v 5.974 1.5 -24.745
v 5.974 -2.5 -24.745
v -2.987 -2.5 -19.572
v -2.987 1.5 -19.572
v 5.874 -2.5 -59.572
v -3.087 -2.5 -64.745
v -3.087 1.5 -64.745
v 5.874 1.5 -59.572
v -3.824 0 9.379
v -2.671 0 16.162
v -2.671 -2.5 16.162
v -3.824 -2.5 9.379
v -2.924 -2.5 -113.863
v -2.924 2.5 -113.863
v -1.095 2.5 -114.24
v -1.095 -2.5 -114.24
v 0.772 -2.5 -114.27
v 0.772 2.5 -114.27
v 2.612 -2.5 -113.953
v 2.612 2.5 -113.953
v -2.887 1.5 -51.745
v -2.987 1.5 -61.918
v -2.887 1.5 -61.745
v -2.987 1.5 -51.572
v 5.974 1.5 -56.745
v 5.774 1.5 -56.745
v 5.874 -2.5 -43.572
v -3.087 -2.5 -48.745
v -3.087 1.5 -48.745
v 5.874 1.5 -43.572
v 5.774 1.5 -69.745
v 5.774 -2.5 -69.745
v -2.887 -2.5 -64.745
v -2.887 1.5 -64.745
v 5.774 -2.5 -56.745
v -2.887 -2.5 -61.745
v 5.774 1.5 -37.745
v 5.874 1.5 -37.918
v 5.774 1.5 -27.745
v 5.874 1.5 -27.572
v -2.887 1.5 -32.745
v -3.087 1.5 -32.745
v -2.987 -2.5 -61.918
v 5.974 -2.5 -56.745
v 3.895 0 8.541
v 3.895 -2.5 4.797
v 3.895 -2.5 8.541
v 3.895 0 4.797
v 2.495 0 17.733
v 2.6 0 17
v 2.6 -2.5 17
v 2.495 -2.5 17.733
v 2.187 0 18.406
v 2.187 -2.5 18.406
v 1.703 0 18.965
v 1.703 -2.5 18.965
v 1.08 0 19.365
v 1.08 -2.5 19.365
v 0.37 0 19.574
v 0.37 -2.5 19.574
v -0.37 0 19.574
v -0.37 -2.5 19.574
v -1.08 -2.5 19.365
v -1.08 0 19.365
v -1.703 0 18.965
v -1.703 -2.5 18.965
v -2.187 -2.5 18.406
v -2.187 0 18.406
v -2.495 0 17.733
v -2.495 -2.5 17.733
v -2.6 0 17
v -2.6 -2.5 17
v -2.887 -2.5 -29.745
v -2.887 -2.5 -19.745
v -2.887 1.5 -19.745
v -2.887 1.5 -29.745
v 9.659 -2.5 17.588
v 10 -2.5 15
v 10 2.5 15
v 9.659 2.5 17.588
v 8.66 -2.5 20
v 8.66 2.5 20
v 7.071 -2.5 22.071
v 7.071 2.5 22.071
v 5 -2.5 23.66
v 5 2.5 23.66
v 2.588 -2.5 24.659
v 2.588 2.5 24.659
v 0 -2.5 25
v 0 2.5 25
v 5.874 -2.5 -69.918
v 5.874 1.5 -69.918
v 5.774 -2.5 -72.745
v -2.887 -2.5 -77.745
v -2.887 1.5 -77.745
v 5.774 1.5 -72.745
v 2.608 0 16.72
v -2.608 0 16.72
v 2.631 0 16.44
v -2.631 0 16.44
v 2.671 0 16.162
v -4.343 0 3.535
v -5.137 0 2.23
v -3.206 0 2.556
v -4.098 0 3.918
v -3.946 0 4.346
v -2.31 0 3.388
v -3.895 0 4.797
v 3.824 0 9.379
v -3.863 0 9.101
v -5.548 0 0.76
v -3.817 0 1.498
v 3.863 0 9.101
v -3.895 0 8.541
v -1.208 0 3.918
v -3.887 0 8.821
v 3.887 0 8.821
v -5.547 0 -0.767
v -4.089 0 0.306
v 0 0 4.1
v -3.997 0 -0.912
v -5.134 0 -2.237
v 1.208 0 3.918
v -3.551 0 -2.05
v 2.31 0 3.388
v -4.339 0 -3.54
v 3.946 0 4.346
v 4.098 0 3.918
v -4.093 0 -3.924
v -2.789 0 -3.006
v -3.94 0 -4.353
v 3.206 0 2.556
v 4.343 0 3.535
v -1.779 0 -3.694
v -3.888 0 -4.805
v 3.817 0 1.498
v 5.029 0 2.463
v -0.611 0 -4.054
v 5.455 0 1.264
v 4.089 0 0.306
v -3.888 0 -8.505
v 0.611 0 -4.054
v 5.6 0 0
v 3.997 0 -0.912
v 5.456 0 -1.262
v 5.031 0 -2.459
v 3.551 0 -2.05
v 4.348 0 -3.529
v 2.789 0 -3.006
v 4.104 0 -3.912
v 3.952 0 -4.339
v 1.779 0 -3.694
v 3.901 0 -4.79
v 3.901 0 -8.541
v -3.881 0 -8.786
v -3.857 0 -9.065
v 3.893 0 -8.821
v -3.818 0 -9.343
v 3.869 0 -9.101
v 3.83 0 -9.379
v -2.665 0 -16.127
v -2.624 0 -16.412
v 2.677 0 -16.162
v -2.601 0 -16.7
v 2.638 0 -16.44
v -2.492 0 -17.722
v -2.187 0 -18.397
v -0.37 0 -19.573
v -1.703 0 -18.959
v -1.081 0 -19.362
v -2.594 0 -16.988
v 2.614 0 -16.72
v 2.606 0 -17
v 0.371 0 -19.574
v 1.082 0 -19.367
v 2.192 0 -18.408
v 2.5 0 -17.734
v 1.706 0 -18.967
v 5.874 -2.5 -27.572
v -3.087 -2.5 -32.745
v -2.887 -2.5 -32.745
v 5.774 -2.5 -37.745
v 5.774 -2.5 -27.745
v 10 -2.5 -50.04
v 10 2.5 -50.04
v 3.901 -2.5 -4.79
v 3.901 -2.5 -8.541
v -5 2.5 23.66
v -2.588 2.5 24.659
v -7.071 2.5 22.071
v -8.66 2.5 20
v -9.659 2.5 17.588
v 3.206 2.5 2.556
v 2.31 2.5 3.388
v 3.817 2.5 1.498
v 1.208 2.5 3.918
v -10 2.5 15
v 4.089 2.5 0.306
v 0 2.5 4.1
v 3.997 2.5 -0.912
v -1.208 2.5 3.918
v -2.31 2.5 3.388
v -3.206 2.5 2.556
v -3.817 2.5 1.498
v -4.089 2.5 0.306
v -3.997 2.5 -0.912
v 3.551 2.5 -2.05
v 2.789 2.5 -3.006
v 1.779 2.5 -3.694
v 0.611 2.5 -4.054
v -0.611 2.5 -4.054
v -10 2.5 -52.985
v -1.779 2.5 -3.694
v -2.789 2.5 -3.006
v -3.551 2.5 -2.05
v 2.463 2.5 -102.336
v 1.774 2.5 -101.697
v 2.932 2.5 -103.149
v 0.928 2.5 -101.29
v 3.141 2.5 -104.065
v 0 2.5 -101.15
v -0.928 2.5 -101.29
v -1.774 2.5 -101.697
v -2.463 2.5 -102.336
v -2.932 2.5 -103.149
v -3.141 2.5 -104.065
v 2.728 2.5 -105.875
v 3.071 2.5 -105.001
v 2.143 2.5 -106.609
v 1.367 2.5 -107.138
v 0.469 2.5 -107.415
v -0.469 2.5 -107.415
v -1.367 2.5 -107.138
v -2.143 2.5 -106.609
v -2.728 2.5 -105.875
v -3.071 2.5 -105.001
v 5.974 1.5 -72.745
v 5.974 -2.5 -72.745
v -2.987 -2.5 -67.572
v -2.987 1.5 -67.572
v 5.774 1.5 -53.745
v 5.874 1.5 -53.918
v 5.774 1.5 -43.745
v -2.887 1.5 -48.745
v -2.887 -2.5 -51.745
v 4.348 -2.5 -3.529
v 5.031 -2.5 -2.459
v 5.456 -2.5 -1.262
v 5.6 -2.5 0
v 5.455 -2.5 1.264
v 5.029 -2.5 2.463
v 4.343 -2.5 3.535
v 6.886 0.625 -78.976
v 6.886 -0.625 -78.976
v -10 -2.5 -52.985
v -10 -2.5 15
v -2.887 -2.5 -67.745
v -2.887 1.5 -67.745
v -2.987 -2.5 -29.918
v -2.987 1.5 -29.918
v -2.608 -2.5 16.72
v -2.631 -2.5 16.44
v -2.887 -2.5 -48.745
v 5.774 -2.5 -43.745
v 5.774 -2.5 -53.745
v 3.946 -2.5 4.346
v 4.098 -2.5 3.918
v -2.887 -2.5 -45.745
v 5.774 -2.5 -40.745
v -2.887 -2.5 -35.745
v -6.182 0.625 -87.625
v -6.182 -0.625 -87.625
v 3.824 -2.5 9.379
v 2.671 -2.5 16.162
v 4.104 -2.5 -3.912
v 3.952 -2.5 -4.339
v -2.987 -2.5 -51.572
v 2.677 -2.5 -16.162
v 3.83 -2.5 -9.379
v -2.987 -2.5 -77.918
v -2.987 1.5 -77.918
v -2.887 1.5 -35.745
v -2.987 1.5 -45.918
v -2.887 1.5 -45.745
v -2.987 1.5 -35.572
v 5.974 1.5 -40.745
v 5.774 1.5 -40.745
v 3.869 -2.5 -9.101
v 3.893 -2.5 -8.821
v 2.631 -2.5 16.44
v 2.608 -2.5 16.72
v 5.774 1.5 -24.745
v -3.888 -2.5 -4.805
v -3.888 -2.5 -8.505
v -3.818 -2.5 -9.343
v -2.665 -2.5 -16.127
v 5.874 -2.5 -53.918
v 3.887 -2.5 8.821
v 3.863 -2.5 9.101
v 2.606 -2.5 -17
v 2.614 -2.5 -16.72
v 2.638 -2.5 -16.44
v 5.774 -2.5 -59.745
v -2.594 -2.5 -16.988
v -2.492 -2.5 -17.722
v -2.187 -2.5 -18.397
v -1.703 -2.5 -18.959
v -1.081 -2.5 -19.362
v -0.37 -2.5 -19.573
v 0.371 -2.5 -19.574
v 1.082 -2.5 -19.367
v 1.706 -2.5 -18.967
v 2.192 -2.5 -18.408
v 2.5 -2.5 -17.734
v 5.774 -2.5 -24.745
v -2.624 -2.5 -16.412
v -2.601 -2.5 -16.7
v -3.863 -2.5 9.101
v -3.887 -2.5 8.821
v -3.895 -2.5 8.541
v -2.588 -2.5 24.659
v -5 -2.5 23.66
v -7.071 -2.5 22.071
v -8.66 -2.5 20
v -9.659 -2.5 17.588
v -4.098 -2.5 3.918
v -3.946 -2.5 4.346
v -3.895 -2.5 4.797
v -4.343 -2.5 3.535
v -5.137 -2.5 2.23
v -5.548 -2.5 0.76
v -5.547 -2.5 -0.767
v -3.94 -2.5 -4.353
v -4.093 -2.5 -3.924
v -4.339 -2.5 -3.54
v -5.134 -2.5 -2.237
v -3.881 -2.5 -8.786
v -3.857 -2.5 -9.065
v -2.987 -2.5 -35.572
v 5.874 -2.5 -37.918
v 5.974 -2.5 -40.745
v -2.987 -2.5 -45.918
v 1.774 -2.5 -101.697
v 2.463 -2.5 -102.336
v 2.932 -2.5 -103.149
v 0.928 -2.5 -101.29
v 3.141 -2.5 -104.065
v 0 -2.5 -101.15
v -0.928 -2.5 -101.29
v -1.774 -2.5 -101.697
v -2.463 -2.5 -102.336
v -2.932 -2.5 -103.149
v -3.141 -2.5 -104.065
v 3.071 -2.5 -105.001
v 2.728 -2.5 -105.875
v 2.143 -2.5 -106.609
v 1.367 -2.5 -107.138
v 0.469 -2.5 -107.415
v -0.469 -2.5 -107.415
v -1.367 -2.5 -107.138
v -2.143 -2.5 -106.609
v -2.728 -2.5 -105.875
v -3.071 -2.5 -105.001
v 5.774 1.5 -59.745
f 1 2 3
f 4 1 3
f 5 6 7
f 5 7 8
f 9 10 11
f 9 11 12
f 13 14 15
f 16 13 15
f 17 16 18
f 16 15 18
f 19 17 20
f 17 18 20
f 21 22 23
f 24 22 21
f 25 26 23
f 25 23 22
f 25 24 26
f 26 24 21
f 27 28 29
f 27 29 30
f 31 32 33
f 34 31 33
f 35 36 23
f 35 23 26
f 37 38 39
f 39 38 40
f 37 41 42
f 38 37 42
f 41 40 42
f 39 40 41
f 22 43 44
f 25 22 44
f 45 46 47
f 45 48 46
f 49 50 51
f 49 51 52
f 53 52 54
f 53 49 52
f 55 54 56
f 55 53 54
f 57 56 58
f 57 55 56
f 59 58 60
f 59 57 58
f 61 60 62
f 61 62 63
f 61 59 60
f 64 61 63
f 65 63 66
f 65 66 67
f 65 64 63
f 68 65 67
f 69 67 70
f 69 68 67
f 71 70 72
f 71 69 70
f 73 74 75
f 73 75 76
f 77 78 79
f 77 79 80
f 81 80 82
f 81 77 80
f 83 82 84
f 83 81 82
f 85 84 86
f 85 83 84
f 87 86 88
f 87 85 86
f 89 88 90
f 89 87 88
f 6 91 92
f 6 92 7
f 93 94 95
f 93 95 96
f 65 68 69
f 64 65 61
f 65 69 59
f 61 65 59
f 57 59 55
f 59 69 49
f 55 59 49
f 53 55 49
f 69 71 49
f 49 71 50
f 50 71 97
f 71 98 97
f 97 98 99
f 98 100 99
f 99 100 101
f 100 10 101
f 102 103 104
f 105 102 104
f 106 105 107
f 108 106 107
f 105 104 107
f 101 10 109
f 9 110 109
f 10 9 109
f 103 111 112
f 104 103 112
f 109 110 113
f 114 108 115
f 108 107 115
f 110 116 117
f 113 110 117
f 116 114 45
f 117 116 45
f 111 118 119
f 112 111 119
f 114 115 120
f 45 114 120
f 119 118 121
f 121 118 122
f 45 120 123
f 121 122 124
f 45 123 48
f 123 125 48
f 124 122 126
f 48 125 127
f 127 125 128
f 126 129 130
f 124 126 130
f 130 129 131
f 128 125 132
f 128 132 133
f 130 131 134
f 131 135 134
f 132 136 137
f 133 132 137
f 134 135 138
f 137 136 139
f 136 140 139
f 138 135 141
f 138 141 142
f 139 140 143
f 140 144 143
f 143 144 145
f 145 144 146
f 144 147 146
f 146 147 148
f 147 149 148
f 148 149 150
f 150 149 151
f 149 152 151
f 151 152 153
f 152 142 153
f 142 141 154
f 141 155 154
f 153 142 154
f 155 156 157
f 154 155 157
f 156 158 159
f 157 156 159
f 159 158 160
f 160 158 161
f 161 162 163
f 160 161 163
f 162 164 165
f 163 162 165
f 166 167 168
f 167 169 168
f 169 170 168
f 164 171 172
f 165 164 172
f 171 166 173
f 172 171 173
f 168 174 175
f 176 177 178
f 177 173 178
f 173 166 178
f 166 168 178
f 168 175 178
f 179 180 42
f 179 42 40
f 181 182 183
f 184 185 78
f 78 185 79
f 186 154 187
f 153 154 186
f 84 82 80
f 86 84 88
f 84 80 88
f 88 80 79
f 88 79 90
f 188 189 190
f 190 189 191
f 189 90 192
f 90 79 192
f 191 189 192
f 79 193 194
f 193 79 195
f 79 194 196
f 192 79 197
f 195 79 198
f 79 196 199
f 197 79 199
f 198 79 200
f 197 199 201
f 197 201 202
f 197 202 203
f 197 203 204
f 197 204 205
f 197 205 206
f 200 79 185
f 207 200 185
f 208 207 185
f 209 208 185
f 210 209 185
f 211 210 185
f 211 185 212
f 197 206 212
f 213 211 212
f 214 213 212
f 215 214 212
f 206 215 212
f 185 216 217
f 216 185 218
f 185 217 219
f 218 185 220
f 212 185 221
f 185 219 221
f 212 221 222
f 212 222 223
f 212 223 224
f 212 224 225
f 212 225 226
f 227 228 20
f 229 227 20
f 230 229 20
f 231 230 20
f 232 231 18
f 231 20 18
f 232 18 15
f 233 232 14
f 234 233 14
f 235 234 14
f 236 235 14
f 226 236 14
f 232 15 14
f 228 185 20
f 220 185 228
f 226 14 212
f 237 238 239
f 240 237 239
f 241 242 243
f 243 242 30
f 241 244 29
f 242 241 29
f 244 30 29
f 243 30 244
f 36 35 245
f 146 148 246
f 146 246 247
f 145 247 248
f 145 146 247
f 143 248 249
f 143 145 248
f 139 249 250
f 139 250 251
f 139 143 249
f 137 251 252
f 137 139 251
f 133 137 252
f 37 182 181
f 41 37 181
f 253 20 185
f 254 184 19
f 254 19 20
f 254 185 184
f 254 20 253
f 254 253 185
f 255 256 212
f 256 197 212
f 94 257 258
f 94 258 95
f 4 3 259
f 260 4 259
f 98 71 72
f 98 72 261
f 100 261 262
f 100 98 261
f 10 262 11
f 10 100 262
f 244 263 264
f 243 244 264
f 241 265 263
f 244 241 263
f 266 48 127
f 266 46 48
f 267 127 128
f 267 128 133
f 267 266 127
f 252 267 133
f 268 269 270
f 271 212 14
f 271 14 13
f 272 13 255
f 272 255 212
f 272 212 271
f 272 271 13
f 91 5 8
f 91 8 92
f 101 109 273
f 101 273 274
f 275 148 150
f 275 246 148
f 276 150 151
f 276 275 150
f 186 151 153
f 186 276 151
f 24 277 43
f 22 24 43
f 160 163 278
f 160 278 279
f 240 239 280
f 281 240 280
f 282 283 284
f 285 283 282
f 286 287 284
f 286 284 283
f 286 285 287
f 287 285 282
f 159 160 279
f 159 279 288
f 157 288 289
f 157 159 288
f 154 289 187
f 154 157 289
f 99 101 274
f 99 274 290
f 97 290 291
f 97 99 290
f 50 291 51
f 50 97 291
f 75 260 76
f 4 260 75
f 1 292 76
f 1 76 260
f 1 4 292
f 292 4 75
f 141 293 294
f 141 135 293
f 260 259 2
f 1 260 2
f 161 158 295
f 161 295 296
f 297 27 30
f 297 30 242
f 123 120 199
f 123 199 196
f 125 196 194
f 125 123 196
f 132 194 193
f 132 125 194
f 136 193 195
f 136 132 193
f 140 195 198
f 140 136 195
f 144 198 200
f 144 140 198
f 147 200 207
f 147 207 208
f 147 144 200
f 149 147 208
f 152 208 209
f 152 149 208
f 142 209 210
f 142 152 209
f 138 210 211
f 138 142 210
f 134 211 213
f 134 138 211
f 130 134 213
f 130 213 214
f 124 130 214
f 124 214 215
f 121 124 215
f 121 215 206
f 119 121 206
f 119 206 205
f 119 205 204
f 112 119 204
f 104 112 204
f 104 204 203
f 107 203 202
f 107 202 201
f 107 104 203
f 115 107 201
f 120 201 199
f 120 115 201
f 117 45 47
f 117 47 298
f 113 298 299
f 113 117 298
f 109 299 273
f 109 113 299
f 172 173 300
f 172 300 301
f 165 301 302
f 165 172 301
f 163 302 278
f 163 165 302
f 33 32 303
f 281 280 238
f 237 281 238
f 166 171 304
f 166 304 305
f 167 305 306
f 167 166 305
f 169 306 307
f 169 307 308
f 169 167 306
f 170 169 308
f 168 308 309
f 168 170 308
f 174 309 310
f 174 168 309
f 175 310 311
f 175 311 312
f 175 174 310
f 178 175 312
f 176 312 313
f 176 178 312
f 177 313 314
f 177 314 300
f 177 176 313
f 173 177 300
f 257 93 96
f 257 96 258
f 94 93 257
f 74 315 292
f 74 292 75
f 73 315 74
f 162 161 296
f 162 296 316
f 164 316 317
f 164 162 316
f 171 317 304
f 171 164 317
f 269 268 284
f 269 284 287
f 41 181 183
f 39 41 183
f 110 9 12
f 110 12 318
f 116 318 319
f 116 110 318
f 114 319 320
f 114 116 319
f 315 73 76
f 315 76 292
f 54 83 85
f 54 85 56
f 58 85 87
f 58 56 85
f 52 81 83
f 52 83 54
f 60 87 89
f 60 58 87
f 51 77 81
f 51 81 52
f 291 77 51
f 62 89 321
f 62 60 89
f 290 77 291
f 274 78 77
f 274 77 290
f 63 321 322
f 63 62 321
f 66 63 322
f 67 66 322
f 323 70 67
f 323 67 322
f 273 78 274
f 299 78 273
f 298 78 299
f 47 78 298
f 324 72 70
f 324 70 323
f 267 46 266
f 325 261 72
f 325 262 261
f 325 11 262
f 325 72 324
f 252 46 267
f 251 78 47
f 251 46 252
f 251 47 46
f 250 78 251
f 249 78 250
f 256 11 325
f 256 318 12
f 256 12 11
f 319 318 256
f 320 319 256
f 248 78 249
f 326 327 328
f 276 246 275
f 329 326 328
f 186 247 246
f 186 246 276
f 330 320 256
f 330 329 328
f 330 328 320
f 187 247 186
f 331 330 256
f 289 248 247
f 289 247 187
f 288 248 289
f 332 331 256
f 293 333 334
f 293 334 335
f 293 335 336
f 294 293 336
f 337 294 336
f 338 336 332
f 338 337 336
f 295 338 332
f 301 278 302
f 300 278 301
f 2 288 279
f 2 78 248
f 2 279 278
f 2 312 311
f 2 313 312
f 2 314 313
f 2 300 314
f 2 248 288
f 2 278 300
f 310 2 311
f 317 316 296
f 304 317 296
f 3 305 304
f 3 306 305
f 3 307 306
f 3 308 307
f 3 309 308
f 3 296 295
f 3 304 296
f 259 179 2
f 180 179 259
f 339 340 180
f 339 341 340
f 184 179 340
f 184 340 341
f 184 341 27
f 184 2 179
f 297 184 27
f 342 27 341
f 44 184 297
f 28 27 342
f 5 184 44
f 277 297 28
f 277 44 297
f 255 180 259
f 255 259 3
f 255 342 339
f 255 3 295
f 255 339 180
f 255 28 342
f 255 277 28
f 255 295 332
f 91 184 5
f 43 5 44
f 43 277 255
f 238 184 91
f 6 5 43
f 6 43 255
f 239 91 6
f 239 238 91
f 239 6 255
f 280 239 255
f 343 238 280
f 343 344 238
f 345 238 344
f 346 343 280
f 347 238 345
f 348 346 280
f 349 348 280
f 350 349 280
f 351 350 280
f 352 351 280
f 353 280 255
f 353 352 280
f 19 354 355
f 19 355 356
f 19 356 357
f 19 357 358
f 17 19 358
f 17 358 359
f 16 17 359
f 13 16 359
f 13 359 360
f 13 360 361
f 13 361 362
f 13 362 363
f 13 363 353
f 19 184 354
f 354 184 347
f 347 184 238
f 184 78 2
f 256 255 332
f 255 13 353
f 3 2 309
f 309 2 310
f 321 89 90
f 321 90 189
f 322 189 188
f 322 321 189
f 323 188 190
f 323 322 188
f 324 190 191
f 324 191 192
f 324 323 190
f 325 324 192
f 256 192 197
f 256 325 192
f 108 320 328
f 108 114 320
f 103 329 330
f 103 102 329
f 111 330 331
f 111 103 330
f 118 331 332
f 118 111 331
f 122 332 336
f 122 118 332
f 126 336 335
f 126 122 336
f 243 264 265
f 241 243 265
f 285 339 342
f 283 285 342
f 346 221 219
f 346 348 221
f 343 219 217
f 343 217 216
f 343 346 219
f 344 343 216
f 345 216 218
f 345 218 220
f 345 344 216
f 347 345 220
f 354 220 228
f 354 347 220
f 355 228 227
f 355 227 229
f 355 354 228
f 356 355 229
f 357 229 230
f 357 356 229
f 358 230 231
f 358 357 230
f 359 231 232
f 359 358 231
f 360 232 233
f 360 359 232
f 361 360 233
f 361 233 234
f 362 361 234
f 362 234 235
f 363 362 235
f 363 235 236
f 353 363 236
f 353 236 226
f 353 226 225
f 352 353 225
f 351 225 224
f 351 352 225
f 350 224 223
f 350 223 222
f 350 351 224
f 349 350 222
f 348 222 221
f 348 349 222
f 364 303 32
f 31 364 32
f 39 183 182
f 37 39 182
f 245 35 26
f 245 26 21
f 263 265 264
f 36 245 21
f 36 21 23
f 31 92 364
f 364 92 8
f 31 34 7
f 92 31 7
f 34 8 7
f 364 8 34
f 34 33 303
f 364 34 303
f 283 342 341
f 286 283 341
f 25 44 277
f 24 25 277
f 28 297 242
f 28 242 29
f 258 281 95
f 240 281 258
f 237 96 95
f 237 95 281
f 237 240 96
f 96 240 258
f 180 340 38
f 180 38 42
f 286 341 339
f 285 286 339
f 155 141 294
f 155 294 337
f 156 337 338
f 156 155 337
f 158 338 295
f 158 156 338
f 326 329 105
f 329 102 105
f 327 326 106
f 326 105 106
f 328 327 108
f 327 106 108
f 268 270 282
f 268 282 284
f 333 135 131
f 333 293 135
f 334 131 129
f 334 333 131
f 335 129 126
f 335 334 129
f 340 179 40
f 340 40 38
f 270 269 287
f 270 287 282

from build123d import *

# Parameters (mm, degrees)
SKETCH1_W           = 15
SKETCH1_H           = 45
BOSS_EXTRUDE1_DEPTH = 2.2
SKETCH1_3_W         = 20
SKETCH1_3_H         = 50
SKETCH1_3_W_2       = 15
SKETCH1_3_H_2       = 45
BOSS_EXTRUDE2_DEPTH = 2.5
SKETCH1_4_W         = 20
SKETCH1_4_H         = 50
SKETCH1_4_R         = 4.1
BOSS_EXTRUDE3_DEPTH = 2.5
FILLET1_R           = 2
SKETCH1_5_R         = 3.15
BOSS_EXTRUDE4_DEPTH = 2.5
FILLET2_R           = 10
SKETCH2_R           = 3.15
CUT_EXTRUDE1_DEPTH  = 4
SKETCH3_OUTSIDE_W   = 50.164
SKETCH3_OUTSIDE_H   = 169.464
CUT_EXTRUDE2_DEPTH  = 115.845504919


with BuildPart() as part:
    # Sketch1 → Boss-Extrude1 (new body)
    with BuildSketch(Plane(origin=(0, 0, 0), x_dir=(1, 0, 0), z_dir=(0, 1, 0))):
        Rectangle(SKETCH1_W, SKETCH1_H)
        with BuildLine():
            ThreePointArc((-3.894544437, -4.023993492), (-5.599998379, 0.004260474), (-3.88841703, 4.029914763))
            Line((-3.88841703, 4.029914763), (-3.88841703, 8.505312122))
            ThreePointArc((-3.88841703, 8.505312122), (-3.870707724, 8.925763598), (-3.817705253, 9.343236712))
            Line((-3.817705253, 9.343236712), (-2.664584371, 16.126741161))
            ThreePointArc((-2.664584371, 16.126741161), (-2.610617779, 16.555799687), (-2.593926654, 16.987916591))
            ThreePointArc((-2.593926654, 16.987916591), (0, 19.6), (2.606045235, 17.000007028))
            ThreePointArc((2.606045235, 17.000007028), (2.623754541, 16.579555552), (2.676757012, 16.162082438))
            Line((2.676757012, 16.162082438), (3.829877895, 9.378577989))
            ThreePointArc((3.829877895, 9.378577989), (3.882880366, 8.961104875), (3.900589672, 8.540653399))
            Line((3.900589672, 8.540653399), (3.900589672, 4.018133922))
            ThreePointArc((3.900589672, 4.018133922), (5.157678846, 2.181364004), (5.6, 0))
            ThreePointArc((5.6, 0), (5.156037667, -2.185240393), (3.894544437, -4.023993492))
            Line((3.894544437, -4.023993492), (3.894544437, -8.540646372))
            ThreePointArc((3.894544437, -8.540646372), (3.876835131, -8.961097847), (3.82383266, -9.378570962))
            Line((3.82383266, -9.378570962), (2.670711777, -16.16207541))
            ThreePointArc((2.670711777, -16.16207541), (2.617709306, -16.579548524), (2.6, -17))
            ThreePointArc((2.6, -17), (0, -19.6), (-2.6, -17))
            ThreePointArc((-2.6, -17), (-2.617709306, -16.579548524), (-2.670711777, -16.16207541))
            Line((-2.670711777, -16.16207541), (-3.82383266, -9.378570962))
            ThreePointArc((-3.82383266, -9.378570962), (-3.876835131, -8.961097847), (-3.894544437, -8.540646372))
            Line((-3.894544437, -8.540646372), (-3.894544437, -4.023993492))
        make_face(mode=Mode.SUBTRACT)
    extrude(amount=-BOSS_EXTRUDE1_DEPTH)

    # Sketch1<3> → Boss-Extrude2 (add)
    # profile 1 of 2: a face of its own
    with BuildSketch(Plane(origin=(0, 0, 0), x_dir=(1, 0, 0), z_dir=(0, 1, 0))):
        Rectangle(SKETCH1_3_W, SKETCH1_3_H)
        Rectangle(SKETCH1_3_W_2, SKETCH1_3_H_2, mode=Mode.SUBTRACT)
    # profile 2 of 2: a face of its own
    with BuildSketch(Plane(origin=(0, 0, 0), x_dir=(1, 0, 0), z_dir=(0, 1, 0))):
        Rectangle(SKETCH1_3_W_2, SKETCH1_3_H_2)
        with BuildLine():
            ThreePointArc((-3.894544437, -4.023993492), (-5.599998379, 0.004260474), (-3.88841703, 4.029914763))
            Line((-3.88841703, 4.029914763), (-3.88841703, 8.505312122))
            ThreePointArc((-3.88841703, 8.505312122), (-3.870707724, 8.925763598), (-3.817705253, 9.343236712))
            Line((-3.817705253, 9.343236712), (-2.664584371, 16.126741161))
            ThreePointArc((-2.664584371, 16.126741161), (-2.610617779, 16.555799687), (-2.593926654, 16.987916591))
            ThreePointArc((-2.593926654, 16.987916591), (0, 19.6), (2.606045235, 17.000007028))
            ThreePointArc((2.606045235, 17.000007028), (2.623754541, 16.579555552), (2.676757012, 16.162082438))
            Line((2.676757012, 16.162082438), (3.829877895, 9.378577989))
            ThreePointArc((3.829877895, 9.378577989), (3.882880366, 8.961104875), (3.900589672, 8.540653399))
            Line((3.900589672, 8.540653399), (3.900589672, 4.018133922))
            ThreePointArc((3.900589672, 4.018133922), (5.157678846, 2.181364004), (5.6, 0))
            ThreePointArc((5.6, 0), (5.156037667, -2.185240393), (3.894544437, -4.023993492))
            Line((3.894544437, -4.023993492), (3.894544437, -8.540646372))
            ThreePointArc((3.894544437, -8.540646372), (3.876835131, -8.961097847), (3.82383266, -9.378570962))
            Line((3.82383266, -9.378570962), (2.670711777, -16.16207541))
            ThreePointArc((2.670711777, -16.16207541), (2.617709306, -16.579548524), (2.6, -17))
            ThreePointArc((2.6, -17), (0, -19.6), (-2.6, -17))
            ThreePointArc((-2.6, -17), (-2.617709306, -16.579548524), (-2.670711777, -16.16207541))
            Line((-2.670711777, -16.16207541), (-3.82383266, -9.378570962))
            ThreePointArc((-3.82383266, -9.378570962), (-3.876835131, -8.961097847), (-3.894544437, -8.540646372))
            Line((-3.894544437, -8.540646372), (-3.894544437, -4.023993492))
        make_face(mode=Mode.SUBTRACT)
    extrude(amount=-BOSS_EXTRUDE2_DEPTH)

    # Sketch1<4> → Boss-Extrude3 (add)
    with BuildSketch(Plane(origin=(0, 0, 0), x_dir=(1, 0, 0), z_dir=(0, 1, 0))):
        Rectangle(SKETCH1_4_W, SKETCH1_4_H)
        with Locations(Location((0, 0, 0), (0, 0, 270))):
            Circle(SKETCH1_4_R, mode=Mode.SUBTRACT)
    extrude(amount=BOSS_EXTRUDE3_DEPTH)

    # Fillet1
    fillet1_edges = [part.edges().sort_by_distance(p)[0] for p in [
        (-3.88841703, -1.25, -4.029914763),
        (-3.894544437, -1.25, 4.023993492),
        (3.894544437, -1.25, 4.023993492),
        (3.900589672, -1.25, -4.018133922),
    ]]
    fillet(fillet1_edges, radius=FILLET1_R)

    # Sketch1<5> → Boss-Extrude4 (add, symmetric)
    with BuildSketch(Plane(origin=(0, 0, 0), x_dir=(1, 0, 0), z_dir=(0, 1, 0))):
        with BuildLine():
            ThreePointArc((-10, 104.3), (0, 114.3), (10, 104.3))
            Line((10, 104.3), (10, 25))
            Line((10, 25), (-10, 25))
            Line((-10, 25), (-10, 104.3))
        make_face()
        with Locations(Location((0, 104.3, 0), (0, 0, 270))):
            Circle(SKETCH1_5_R, mode=Mode.SUBTRACT)
    extrude(amount=BOSS_EXTRUDE4_DEPTH, both=True)

    # Fillet2
    fillet2_edges = [part.edges().sort_by_distance(p)[0] for p in [
        (10, 0, 25),
        (-10, 0, 25),
    ]]
    fillet(fillet2_edges, radius=FILLET2_R - 0.0001)  # a hair under: the kernel refuses the full size

    # Sketch2 → Cut-Extrude1 (cut)
    # profile 1 of 8: a face of its own
    with BuildSketch(Plane.XZ.offset(2.5)):
        with Locations(Location((0, -104.3, 0), (0, 0, 90))):
            Circle(SKETCH2_R)
    # profile 2 of 8: a face of its own
    with BuildSketch(Plane.XZ.offset(2.5)):
        Polygon((5.973502692, -72.744870683), (-2.986751346, -67.571665602), (-2.986751346, -77.918075763), align=None)
        Polygon((5.773502692, -72.744870683), (-2.886751346, -67.744870683), (-2.886751346, -77.744870683), align=None, mode=Mode.SUBTRACT)
    # profile 3 of 8: a face of its own
    with BuildSketch(Plane.XZ.offset(2.5)):
        Polygon((5.973502692, -56.744870683), (-2.986751346, -51.571665602), (-2.986751346, -61.918075763), align=None)
        Polygon((5.773502692, -56.744870683), (-2.886751346, -51.744870683), (-2.886751346, -61.744870683), align=None, mode=Mode.SUBTRACT)
    # profile 4 of 8: a face of its own
    with BuildSketch(Plane.XZ.offset(2.5)):
        Polygon((5.973502692, -40.744870683), (-2.986751346, -35.571665602), (-2.986751346, -45.918075763), align=None)
        Polygon((5.773502692, -40.744870683), (-2.886751346, -35.744870683), (-2.886751346, -45.744870683), align=None, mode=Mode.SUBTRACT)
    # profile 5 of 8: a face of its own
    with BuildSketch(Plane.XZ.offset(2.5)):
        Polygon((5.973502692, -24.744870683), (-2.986751346, -19.571665602), (-2.986751346, -29.918075763), align=None)
        Polygon((5.773502692, -24.744870683), (-2.886751346, -19.744870683), (-2.886751346, -29.744870683), align=None, mode=Mode.SUBTRACT)
    # profile 6 of 8: a face of its own
    with BuildSketch(Plane.XZ.offset(2.5)):
        Polygon((-3.086751346, -64.744870683), (5.873502692, -59.571665602), (5.873502692, -69.918075763), align=None)
        Polygon((5.773502692, -69.744870683), (-2.886751346, -64.744870683), (5.773502692, -59.744870683), align=None, mode=Mode.SUBTRACT)
    # profile 7 of 8: a face of its own
    with BuildSketch(Plane.XZ.offset(2.5)):
        Polygon((-3.086751346, -48.744870683), (5.873502692, -43.571665602), (5.873502692, -53.918075763), align=None)
        Polygon((5.773502692, -53.744870683), (-2.886751346, -48.744870683), (5.773502692, -43.744870683), align=None, mode=Mode.SUBTRACT)
    # profile 8 of 8: a face of its own
    with BuildSketch(Plane.XZ.offset(2.5)):
        Polygon((-3.086751346, -32.744870683), (5.873502692, -27.571665602), (5.873502692, -37.918075763), align=None)
        Polygon((5.773502692, -37.744870683), (-2.886751346, -32.744870683), (5.773502692, -27.744870683), align=None, mode=Mode.SUBTRACT)
    extrude(amount=-CUT_EXTRUDE1_DEPTH, mode=Mode.SUBTRACT)

    # Sketch3 outside → Cut-Extrude2 (cut, through all)
    with BuildSketch(Plane.XZ.offset(2.5)):
        with Locations((0, -44.65)):
            Rectangle(SKETCH3_OUTSIDE_W, SKETCH3_OUTSIDE_H)
        with BuildLine():
            Line((10, -50.039570793), (10, 15))
            ThreePointArc((10, 15), (7.071067812, 22.071067812), (0, 25))
            ThreePointArc((0, 25), (-7.071067812, 22.071067812), (-10, 15))
            Line((-10, 15), (-10, -52.98511299))
            add(Edge.make_bspline(
                [(-10, -52.98511299), (-9.762519387, -55.301766927), (-9.181616668, -60.883726896), (-8.247873188, -69.548054482), (-7.214243072, -78.778305336), (-6.212768932, -87.409094774), (-5.257188729, -95.387335619), (-4.359016041, -102.663786405), (-3.588431315, -108.744280233), (-3.115741639, -112.393973299), (-2.923840172, -113.863009916)],
                knots=[0.870609711, 0.870609711, 0.870609711, 0.870609711, 0.882031045, 0.898133678, 0.913348978, 0.927582736, 0.940746445, 0.952757055, 0.963540146, 0.970806103, 0.970806103, 0.970806103, 0.970806103], degree=3))
            ThreePointArc((-2.923840172, -113.863009916), (-0.162206263, -114.29868437), (2.612106393, -113.952818251))
            add(Edge.make_bspline(
                [(2.612106393, -113.952818251), (2.807985487, -112.453854191), (3.284635603, -108.774231255), (4.059016041, -102.663786405), (4.957188729, -95.387335619), (5.912768932, -87.409094774), (6.914243072, -78.778305336), (7.947873188, -69.548054482), (8.987364419, -59.902479724), (9.66619931, -53.338446984), (10, -50.039570793)],
                knots=[0.029045831, 0.029045831, 0.029045831, 0.029045831, 0.036459854, 0.047242945, 0.059253555, 0.072417264, 0.086651022, 0.101866322, 0.117968955, 0.134230571, 0.134230571, 0.134230571, 0.134230571], degree=3))
        make_face(mode=Mode.SUBTRACT)
    extrude(amount=-CUT_EXTRUDE2_DEPTH, mode=Mode.SUBTRACT)


solid = part.part
